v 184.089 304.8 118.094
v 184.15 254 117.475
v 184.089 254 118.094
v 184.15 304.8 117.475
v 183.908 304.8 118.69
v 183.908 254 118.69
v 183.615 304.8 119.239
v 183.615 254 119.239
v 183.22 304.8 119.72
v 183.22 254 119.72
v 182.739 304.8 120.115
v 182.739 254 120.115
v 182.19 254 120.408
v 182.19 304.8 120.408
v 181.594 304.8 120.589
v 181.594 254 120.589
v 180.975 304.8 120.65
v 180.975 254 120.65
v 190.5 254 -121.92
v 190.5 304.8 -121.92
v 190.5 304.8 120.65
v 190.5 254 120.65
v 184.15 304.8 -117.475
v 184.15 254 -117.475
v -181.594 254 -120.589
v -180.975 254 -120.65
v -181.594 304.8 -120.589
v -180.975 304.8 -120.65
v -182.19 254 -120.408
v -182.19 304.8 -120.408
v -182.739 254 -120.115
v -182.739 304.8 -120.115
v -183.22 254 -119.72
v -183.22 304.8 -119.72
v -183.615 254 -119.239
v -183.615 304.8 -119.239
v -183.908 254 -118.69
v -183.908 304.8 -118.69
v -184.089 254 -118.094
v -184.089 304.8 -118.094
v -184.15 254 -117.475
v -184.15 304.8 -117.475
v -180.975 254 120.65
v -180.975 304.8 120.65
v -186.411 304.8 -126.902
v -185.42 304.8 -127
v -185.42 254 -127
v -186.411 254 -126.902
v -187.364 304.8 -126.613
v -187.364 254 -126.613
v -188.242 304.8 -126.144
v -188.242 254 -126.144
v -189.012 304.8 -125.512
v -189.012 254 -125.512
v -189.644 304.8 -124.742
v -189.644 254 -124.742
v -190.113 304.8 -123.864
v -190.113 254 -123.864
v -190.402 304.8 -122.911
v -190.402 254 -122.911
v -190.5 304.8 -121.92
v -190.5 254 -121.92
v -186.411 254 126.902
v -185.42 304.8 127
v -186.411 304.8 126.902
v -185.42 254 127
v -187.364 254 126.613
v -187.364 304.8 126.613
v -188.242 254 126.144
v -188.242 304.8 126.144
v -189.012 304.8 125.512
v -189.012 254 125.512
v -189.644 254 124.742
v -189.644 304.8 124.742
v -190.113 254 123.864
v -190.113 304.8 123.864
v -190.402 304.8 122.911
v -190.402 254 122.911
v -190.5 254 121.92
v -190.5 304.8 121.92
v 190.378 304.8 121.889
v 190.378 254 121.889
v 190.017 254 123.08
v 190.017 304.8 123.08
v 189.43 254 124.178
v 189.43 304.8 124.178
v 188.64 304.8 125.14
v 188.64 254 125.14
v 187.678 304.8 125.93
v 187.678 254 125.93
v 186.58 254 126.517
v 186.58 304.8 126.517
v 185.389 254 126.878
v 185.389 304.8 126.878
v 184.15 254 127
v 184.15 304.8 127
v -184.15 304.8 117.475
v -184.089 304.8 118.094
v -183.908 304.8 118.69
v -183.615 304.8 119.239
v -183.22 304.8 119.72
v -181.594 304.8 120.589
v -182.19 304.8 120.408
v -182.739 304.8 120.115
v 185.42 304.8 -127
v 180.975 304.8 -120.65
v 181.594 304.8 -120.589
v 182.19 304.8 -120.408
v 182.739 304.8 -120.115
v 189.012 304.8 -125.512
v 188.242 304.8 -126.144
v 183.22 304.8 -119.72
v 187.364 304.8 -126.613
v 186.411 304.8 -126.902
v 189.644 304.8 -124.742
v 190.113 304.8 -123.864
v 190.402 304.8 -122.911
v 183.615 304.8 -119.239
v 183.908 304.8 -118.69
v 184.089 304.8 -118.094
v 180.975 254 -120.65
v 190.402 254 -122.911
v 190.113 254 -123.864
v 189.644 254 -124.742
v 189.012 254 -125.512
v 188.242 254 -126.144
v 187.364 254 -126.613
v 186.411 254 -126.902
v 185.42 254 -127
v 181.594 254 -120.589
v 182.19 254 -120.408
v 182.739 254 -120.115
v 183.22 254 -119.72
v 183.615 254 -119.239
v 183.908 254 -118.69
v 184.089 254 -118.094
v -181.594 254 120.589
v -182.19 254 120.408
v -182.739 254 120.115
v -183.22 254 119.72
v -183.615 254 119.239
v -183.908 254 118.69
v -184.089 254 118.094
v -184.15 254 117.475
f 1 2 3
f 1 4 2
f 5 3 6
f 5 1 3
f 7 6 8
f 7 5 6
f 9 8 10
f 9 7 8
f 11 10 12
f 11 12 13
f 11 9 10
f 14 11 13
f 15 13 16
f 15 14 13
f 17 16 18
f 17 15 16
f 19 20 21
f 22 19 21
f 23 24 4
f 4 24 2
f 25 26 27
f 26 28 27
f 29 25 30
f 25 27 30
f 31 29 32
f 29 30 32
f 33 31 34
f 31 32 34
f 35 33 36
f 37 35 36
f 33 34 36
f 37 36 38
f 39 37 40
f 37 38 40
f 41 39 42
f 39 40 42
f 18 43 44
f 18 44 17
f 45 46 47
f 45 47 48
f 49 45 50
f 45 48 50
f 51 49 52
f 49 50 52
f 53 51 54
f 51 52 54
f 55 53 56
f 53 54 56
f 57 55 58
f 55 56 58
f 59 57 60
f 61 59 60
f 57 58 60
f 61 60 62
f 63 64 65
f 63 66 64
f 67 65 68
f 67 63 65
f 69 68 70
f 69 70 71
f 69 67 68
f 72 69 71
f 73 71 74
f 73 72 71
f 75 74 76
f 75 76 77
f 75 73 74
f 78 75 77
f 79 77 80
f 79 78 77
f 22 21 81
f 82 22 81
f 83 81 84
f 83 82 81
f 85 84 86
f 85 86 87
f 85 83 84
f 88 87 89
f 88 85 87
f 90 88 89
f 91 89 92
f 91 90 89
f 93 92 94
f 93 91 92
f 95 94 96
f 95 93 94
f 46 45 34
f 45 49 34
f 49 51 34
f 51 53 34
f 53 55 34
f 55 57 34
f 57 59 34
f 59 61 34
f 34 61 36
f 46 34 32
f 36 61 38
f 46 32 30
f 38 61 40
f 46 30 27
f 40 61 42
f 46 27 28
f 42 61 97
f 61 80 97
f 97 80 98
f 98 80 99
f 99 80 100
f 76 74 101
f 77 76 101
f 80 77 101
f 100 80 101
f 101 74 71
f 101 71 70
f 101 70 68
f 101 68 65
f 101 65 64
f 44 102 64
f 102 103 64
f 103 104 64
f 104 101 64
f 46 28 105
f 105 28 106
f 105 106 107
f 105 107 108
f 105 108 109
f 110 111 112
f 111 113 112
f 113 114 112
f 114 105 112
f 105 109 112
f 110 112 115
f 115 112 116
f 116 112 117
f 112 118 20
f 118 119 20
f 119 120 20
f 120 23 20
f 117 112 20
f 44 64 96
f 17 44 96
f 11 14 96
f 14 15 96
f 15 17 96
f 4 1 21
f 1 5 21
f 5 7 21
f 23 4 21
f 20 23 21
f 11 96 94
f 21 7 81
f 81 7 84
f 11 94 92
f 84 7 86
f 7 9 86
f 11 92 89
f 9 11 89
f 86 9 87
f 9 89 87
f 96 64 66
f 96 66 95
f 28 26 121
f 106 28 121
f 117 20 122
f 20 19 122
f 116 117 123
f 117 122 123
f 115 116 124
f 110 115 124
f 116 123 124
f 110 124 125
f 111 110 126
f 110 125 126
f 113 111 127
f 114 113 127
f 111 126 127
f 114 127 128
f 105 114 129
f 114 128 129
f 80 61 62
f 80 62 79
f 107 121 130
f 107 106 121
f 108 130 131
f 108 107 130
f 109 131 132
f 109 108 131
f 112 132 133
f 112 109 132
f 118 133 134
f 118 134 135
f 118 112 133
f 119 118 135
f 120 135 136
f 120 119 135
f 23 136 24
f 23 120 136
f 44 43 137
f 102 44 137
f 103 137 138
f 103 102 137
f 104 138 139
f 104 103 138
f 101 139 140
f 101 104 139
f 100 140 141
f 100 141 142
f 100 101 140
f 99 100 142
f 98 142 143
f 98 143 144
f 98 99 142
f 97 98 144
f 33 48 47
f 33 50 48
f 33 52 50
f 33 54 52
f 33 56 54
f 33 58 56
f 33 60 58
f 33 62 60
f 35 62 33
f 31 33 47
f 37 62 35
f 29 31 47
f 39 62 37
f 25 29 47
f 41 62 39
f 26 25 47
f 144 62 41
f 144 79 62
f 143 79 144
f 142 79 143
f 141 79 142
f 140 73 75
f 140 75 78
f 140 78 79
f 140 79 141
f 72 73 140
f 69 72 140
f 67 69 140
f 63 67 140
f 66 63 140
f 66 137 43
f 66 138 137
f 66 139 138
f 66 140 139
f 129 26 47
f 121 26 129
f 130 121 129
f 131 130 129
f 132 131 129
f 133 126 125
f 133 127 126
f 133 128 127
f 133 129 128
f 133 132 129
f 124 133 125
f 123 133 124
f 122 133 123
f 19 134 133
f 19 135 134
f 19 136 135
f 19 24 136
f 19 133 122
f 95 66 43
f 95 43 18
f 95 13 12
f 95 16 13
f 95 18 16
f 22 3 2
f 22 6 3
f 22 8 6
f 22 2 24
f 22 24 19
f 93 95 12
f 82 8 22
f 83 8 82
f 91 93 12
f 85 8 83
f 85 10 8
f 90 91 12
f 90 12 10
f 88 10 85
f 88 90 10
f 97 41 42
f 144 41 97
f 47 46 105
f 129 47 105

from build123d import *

# Parameters (mm, degrees)
F0_W     = 381
F0_H     = 254
F1_DEPTH = 50.8
F2_R     = 6.35
F3_R     = 5.08
F5_W     = 368.3
F5_H     = 241.3
F6_DEPTH = 50.8
F7_R     = 3.175


with BuildPart() as f1:
    # F0 (on Front) → F1 (new body)
    with BuildSketch(Plane.XZ):
        Rectangle(F0_W, F0_H)
    extrude(amount=F1_DEPTH)

    # F2
    f2_edges = [f1.edges().sort_by_distance(p)[0] for p in [
        (190.5, -25.4, 127),
    ]]
    fillet(f2_edges, radius=F2_R)

    # F3
    f3_edges = [f1.edges().sort_by_distance(p)[0] for p in [
        (190.5, -25.4, -127),
        (-190.5, -25.4, 127),
        (-190.5, -25.4, -127),
    ]]
    fillet(f3_edges, radius=F3_R)


with BuildPart() as f1_1:
    # F4: moved
    add(f1.part.moved(Location((0, 50.8, 0))))

    # F5 (on Front) → F6 (cut)
    with BuildSketch(Plane.XZ):
        Rectangle(F5_W, F5_H)
    extrude(amount=-F6_DEPTH, mode=Mode.SUBTRACT)

    # F7
    f7_edges = [f1_1.edges().sort_by_distance(p)[0] for p in [
        (-184.15, 25.4, -120.65),
        (-184.15, 25.4, 120.65),
        (184.15, 25.4, -120.65),
        (184.15, 25.4, 120.65),
    ]]
    fillet(f7_edges, radius=F7_R)


with BuildPart() as f1_2:
    # F8: moved
    add(f1_1.part.moved(Location((0, 50.8, 0))))


with BuildPart() as f1_3:
    # F9: moved
    add(f1_2.part.moved(Location((0, 203.2, 0))))


solid = f1_3.part
